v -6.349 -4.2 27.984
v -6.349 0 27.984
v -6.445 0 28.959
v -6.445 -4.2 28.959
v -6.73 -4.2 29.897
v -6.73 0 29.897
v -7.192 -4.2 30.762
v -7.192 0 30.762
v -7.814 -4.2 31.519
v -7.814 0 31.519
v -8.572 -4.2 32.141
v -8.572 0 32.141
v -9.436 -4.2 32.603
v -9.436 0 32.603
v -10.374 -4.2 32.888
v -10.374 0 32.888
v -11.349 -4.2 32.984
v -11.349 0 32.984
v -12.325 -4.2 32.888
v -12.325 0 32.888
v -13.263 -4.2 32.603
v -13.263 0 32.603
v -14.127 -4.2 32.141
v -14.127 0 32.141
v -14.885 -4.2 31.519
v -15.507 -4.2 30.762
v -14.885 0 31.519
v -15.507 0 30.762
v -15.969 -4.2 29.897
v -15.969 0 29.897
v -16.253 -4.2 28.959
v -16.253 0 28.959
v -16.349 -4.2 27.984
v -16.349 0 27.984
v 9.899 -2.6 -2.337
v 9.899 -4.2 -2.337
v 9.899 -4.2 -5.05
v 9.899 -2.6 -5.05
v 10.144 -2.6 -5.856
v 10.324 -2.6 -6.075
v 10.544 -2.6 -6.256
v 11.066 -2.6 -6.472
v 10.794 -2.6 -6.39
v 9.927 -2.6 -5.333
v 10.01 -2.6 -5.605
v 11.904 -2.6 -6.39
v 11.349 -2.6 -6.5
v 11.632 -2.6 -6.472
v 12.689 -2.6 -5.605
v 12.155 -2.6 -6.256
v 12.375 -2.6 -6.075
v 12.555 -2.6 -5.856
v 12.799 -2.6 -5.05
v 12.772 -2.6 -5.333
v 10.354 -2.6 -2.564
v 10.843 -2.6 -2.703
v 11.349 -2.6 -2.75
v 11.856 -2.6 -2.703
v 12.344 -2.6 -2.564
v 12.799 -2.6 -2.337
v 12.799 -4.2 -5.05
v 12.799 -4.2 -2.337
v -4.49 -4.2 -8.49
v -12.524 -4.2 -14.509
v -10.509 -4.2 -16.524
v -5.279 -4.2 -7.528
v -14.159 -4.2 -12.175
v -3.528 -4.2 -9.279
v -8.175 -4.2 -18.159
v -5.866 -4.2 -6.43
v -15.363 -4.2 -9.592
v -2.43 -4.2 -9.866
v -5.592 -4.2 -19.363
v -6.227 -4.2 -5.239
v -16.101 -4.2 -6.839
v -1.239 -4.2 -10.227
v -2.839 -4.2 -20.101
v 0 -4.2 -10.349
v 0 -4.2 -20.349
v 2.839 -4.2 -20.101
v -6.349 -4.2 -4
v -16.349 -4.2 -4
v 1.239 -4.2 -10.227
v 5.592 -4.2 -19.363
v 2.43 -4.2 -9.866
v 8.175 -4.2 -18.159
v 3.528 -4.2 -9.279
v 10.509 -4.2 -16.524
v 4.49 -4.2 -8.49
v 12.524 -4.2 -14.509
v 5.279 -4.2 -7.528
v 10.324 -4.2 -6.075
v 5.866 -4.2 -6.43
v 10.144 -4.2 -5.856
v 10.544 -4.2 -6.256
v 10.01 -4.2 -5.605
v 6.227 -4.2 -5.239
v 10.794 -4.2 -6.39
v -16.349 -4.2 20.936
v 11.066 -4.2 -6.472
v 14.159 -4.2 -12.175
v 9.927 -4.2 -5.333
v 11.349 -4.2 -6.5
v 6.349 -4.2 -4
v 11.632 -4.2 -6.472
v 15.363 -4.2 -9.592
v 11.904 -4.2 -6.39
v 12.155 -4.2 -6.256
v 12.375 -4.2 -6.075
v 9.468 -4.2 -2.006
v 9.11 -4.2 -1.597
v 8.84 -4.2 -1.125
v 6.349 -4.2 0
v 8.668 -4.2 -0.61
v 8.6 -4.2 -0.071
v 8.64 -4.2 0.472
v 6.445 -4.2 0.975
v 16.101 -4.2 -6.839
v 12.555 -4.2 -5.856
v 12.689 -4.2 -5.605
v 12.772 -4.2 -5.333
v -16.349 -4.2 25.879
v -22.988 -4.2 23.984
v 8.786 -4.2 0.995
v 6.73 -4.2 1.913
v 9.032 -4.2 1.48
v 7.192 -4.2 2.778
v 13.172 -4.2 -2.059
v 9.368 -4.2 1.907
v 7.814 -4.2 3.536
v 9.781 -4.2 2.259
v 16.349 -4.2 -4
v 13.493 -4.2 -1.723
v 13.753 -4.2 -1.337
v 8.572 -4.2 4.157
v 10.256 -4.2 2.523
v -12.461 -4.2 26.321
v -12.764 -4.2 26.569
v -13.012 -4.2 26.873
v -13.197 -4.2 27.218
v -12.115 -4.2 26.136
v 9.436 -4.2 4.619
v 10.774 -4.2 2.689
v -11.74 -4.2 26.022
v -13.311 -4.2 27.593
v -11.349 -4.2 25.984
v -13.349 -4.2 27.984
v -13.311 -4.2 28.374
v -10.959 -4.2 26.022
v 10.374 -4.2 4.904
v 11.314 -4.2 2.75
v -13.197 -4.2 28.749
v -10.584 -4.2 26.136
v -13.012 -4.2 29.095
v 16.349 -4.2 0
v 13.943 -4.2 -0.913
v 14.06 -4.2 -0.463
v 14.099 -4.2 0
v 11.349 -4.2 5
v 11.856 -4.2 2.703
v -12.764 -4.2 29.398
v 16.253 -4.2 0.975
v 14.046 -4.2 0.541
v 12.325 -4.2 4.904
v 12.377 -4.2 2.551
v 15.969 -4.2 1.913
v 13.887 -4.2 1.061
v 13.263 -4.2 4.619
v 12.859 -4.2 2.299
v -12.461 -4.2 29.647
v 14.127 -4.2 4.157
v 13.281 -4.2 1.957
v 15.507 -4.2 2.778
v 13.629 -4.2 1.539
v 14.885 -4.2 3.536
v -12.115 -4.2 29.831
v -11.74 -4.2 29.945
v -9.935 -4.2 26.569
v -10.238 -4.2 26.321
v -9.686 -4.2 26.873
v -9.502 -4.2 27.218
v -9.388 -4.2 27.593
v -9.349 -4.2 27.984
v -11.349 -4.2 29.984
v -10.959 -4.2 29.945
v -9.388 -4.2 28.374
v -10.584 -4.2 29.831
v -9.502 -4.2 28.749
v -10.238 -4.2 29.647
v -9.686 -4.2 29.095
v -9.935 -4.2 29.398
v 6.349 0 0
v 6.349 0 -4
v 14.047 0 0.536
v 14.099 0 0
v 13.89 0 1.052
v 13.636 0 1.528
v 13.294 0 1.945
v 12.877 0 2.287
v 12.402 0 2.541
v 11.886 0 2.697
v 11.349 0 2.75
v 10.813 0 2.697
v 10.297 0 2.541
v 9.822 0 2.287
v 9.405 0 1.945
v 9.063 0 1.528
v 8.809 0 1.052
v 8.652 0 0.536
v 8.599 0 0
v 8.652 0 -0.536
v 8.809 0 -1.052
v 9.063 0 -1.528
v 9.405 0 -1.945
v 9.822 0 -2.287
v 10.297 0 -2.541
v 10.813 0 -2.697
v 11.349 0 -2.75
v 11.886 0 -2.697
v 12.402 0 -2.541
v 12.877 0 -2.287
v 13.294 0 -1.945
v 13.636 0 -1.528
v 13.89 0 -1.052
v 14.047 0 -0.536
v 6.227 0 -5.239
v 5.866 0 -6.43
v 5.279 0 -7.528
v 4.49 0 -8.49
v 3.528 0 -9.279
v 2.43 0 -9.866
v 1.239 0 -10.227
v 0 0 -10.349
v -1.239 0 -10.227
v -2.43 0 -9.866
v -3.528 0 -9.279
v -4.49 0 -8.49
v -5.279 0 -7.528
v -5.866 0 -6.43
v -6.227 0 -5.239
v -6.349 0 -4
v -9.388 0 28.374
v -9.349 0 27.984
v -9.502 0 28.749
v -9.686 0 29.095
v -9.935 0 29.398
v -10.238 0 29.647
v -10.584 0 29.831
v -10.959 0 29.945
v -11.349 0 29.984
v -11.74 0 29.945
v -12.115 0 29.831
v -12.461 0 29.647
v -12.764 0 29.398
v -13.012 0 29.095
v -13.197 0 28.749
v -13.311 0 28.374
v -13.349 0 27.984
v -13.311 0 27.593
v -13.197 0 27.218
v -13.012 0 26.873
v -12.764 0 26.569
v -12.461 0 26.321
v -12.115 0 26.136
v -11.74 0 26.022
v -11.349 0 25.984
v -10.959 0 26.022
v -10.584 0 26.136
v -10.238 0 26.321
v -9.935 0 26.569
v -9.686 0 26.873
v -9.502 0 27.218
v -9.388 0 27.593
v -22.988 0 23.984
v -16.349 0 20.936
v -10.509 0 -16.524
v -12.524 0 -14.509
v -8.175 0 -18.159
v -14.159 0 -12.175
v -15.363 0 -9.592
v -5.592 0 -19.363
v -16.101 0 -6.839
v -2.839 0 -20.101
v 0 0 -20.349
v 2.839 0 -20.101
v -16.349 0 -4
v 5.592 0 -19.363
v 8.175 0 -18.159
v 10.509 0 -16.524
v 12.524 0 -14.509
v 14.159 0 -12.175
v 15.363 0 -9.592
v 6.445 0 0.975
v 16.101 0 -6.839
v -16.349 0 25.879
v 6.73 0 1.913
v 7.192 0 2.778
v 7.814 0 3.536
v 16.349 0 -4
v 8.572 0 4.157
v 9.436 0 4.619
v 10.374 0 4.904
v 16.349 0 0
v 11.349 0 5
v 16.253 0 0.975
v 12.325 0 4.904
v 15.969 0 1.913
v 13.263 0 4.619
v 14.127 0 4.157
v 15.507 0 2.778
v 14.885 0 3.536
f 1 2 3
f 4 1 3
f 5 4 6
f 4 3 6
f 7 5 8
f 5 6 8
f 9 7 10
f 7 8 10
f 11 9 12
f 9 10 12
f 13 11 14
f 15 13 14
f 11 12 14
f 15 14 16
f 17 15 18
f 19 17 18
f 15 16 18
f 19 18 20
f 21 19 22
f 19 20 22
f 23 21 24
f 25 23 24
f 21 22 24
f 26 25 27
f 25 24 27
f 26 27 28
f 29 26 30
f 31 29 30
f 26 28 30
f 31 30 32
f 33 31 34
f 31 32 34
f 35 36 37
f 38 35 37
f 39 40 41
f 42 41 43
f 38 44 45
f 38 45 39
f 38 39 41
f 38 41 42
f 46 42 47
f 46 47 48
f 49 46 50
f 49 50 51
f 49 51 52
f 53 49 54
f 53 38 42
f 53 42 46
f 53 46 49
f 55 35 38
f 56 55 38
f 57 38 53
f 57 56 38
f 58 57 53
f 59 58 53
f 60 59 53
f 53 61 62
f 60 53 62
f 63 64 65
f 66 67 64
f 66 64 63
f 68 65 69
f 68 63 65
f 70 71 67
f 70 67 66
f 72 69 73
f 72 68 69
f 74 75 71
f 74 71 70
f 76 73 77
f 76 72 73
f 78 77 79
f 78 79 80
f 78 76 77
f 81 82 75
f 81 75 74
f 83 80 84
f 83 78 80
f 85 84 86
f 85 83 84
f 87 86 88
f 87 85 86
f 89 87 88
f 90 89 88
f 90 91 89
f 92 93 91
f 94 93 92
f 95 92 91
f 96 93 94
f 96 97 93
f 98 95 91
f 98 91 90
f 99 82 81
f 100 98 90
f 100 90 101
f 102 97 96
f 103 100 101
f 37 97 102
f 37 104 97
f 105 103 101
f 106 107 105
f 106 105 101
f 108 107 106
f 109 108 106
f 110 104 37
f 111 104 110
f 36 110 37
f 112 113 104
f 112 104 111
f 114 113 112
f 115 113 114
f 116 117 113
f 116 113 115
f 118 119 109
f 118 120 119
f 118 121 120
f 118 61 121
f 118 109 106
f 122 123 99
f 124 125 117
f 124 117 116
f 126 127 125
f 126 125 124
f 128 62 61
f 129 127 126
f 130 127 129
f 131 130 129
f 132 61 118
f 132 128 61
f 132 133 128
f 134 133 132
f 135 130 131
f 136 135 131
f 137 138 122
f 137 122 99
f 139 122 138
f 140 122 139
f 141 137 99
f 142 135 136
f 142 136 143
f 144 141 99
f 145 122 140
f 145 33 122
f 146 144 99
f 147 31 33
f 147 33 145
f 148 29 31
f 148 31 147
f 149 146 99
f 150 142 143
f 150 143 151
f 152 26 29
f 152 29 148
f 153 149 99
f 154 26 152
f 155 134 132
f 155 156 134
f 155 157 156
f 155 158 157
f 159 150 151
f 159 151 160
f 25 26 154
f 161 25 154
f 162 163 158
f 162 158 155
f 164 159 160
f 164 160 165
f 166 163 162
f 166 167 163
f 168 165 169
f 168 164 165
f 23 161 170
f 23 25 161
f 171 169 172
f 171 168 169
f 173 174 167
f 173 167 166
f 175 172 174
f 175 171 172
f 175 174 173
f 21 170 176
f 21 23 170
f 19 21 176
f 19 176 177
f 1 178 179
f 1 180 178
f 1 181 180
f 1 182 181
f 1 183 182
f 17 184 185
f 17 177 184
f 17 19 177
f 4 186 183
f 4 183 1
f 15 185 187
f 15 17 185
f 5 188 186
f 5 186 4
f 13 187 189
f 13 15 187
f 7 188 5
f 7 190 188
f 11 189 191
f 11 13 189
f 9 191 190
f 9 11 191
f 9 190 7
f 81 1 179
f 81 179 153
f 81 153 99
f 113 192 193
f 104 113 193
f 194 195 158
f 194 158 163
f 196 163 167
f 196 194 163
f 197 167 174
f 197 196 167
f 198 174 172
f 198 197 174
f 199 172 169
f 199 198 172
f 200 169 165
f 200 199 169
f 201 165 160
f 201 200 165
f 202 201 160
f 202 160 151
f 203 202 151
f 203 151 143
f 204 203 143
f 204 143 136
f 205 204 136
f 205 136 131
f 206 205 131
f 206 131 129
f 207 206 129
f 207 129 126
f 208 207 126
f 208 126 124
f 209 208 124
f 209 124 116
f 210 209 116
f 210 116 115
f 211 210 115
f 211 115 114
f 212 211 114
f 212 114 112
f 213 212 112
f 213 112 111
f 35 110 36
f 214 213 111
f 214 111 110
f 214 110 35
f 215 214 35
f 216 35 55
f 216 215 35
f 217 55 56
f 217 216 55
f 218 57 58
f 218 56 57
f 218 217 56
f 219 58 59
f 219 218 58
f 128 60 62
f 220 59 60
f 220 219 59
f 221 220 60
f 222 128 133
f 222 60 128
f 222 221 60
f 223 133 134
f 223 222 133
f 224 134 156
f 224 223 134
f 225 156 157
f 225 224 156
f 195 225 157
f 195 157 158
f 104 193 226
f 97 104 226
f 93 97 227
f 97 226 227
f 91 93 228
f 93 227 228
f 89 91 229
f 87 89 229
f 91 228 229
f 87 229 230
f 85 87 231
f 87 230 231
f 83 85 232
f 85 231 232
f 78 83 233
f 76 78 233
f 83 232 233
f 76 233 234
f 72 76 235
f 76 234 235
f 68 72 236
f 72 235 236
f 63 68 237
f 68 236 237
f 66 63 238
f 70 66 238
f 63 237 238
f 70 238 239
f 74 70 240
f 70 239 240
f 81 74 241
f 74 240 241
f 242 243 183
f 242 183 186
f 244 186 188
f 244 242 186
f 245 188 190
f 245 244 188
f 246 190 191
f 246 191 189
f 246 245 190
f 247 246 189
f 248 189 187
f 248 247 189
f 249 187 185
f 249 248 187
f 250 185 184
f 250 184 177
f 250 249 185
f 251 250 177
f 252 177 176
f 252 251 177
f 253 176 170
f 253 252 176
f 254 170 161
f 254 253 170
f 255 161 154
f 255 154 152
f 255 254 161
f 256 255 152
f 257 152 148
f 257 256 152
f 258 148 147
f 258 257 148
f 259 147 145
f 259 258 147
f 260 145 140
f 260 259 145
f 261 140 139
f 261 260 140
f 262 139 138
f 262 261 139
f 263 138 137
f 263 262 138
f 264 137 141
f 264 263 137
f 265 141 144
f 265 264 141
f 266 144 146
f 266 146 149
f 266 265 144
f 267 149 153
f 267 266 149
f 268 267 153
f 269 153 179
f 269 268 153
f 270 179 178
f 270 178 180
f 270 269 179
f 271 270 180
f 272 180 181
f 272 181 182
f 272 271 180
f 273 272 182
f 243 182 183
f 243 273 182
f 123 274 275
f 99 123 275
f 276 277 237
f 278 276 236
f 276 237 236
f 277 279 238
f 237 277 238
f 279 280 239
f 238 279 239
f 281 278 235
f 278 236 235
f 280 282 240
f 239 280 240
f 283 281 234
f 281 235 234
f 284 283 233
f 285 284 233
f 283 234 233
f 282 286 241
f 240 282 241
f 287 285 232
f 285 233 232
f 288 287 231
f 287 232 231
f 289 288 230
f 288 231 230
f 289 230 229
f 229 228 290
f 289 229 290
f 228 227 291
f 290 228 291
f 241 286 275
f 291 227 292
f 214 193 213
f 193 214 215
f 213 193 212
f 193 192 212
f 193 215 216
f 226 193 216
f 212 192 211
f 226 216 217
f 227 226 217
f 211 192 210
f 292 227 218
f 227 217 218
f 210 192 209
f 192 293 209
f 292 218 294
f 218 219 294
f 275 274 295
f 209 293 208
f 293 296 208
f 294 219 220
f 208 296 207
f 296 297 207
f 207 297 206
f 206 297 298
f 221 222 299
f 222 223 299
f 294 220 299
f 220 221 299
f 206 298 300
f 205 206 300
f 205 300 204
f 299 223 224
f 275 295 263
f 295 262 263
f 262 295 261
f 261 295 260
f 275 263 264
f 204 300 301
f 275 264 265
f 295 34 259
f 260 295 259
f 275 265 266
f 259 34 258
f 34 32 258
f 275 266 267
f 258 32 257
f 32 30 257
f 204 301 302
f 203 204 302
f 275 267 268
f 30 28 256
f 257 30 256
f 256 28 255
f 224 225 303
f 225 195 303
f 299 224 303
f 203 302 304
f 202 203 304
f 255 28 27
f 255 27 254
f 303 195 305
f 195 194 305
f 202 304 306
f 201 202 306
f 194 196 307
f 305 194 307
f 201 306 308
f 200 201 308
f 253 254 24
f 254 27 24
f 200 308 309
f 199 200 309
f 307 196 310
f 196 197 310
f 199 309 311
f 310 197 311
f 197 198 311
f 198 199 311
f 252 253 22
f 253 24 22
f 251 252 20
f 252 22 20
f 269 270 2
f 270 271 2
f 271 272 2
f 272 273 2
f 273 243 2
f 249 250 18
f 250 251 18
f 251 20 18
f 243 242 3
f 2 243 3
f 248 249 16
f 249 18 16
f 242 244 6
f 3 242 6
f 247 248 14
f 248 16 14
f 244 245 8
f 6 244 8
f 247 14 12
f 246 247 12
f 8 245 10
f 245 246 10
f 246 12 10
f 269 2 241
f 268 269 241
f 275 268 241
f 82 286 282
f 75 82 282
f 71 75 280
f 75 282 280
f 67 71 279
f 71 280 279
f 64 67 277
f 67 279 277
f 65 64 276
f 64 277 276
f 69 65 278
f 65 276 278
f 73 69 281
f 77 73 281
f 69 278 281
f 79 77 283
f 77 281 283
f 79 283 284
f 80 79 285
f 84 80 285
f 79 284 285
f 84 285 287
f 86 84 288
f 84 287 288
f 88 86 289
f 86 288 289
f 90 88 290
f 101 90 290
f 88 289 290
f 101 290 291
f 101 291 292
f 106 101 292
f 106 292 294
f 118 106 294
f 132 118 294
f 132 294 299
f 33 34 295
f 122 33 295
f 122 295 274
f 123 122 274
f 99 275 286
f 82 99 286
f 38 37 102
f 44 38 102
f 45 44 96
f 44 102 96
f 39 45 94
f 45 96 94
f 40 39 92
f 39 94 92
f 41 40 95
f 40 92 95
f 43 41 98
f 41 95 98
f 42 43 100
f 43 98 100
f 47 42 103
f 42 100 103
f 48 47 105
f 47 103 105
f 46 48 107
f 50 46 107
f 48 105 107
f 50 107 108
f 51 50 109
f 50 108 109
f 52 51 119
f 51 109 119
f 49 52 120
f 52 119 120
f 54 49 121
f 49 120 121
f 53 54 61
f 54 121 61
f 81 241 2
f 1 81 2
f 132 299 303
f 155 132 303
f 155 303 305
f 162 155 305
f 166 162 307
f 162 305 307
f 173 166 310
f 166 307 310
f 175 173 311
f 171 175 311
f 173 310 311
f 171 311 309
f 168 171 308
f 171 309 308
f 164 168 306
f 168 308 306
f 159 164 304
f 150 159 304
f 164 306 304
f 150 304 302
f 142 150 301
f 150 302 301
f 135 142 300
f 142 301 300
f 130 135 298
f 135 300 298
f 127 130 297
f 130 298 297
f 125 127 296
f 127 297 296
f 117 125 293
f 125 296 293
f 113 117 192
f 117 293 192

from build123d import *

# Parameters (mm, degrees)
F1_R     = 2.75
F1_R_2   = 2
F2_DEPTH = 4.2
F4_DEPTH = 1.6


with BuildPart() as f2:
    # F1 (on Front) → F2 (new body)
    with BuildSketch(Plane.XZ):
        with BuildLine():
            Line((-6.3493797847, -4), (-6.3493798562, 27.98366989))
            ThreePointArc((-6.3493798562, 27.98366989), (-11.3493798562, 32.9836699012), (-16.3493798562, 27.98366989))
            Line((-16.3493798562, 27.98366989), (-16.3493798515, 25.8790112235))
            Line((-16.3493798515, 25.8790112235), (-22.9881312178, 23.98366989))
            Line((-22.9881312178, 23.98366989), (-16.3493798405, 20.9362090031))
            Line((-16.3493798405, 20.9362090031), (-16.3493797847, -4))
            ThreePointArc((-16.3493797847, -4), (0, -20.349379785), (16.3493797847, -4))
            Line((16.3493797847, -4), (16.3493797847, 0))
            ThreePointArc((16.3493797847, 0), (11.3493797847, 5), (6.3493797847, 0))
            Line((6.3493797847, 0), (6.3493797847, -4))
            ThreePointArc((6.3493797847, -4), (0, -10.3493797847), (-6.3493797847, -4))
        make_face()
        with Locations((11.3493797847, 0)):
            Circle(F1_R, mode=Mode.SUBTRACT)
        with Locations((-11.3493798562, 27.9836699012)):
            Circle(F1_R_2, mode=Mode.SUBTRACT)
    extrude(amount=F2_DEPTH)

    # F3 (on face) → F4 (cut)
    with BuildSketch(Plane.XZ.offset(4.2)):
        with BuildLine():
            ThreePointArc((9.8993797847, -2.3366642891), (11.3493797847, -2.75), (12.7993797847, -2.3366642891))
            ThreePointArc((12.7993797847, -2.3366642891), (13.7525027528, -1.3369741957), (14.0993797847, 0))
            ThreePointArc((14.0993797847, 0), (10.012405589, 2.4031229681), (9.8993797847, -2.3366642891))
        make_face()
        with BuildLine():
            Line((12.7993797847, -5.05), (12.7993797847, -2.3366642891))
            ThreePointArc((12.7993797847, -2.3366642891), (11.3493797847, -2.75), (9.8993797847, -2.3366642891))
            Line((9.8993797847, -2.3366642891), (9.8993797847, -5.05))
            ThreePointArc((9.8993797847, -5.05), (11.3493797847, -6.5), (12.7993797847, -5.05))
        make_face()
    extrude(amount=-F4_DEPTH, mode=Mode.SUBTRACT)


solid = f2.part
